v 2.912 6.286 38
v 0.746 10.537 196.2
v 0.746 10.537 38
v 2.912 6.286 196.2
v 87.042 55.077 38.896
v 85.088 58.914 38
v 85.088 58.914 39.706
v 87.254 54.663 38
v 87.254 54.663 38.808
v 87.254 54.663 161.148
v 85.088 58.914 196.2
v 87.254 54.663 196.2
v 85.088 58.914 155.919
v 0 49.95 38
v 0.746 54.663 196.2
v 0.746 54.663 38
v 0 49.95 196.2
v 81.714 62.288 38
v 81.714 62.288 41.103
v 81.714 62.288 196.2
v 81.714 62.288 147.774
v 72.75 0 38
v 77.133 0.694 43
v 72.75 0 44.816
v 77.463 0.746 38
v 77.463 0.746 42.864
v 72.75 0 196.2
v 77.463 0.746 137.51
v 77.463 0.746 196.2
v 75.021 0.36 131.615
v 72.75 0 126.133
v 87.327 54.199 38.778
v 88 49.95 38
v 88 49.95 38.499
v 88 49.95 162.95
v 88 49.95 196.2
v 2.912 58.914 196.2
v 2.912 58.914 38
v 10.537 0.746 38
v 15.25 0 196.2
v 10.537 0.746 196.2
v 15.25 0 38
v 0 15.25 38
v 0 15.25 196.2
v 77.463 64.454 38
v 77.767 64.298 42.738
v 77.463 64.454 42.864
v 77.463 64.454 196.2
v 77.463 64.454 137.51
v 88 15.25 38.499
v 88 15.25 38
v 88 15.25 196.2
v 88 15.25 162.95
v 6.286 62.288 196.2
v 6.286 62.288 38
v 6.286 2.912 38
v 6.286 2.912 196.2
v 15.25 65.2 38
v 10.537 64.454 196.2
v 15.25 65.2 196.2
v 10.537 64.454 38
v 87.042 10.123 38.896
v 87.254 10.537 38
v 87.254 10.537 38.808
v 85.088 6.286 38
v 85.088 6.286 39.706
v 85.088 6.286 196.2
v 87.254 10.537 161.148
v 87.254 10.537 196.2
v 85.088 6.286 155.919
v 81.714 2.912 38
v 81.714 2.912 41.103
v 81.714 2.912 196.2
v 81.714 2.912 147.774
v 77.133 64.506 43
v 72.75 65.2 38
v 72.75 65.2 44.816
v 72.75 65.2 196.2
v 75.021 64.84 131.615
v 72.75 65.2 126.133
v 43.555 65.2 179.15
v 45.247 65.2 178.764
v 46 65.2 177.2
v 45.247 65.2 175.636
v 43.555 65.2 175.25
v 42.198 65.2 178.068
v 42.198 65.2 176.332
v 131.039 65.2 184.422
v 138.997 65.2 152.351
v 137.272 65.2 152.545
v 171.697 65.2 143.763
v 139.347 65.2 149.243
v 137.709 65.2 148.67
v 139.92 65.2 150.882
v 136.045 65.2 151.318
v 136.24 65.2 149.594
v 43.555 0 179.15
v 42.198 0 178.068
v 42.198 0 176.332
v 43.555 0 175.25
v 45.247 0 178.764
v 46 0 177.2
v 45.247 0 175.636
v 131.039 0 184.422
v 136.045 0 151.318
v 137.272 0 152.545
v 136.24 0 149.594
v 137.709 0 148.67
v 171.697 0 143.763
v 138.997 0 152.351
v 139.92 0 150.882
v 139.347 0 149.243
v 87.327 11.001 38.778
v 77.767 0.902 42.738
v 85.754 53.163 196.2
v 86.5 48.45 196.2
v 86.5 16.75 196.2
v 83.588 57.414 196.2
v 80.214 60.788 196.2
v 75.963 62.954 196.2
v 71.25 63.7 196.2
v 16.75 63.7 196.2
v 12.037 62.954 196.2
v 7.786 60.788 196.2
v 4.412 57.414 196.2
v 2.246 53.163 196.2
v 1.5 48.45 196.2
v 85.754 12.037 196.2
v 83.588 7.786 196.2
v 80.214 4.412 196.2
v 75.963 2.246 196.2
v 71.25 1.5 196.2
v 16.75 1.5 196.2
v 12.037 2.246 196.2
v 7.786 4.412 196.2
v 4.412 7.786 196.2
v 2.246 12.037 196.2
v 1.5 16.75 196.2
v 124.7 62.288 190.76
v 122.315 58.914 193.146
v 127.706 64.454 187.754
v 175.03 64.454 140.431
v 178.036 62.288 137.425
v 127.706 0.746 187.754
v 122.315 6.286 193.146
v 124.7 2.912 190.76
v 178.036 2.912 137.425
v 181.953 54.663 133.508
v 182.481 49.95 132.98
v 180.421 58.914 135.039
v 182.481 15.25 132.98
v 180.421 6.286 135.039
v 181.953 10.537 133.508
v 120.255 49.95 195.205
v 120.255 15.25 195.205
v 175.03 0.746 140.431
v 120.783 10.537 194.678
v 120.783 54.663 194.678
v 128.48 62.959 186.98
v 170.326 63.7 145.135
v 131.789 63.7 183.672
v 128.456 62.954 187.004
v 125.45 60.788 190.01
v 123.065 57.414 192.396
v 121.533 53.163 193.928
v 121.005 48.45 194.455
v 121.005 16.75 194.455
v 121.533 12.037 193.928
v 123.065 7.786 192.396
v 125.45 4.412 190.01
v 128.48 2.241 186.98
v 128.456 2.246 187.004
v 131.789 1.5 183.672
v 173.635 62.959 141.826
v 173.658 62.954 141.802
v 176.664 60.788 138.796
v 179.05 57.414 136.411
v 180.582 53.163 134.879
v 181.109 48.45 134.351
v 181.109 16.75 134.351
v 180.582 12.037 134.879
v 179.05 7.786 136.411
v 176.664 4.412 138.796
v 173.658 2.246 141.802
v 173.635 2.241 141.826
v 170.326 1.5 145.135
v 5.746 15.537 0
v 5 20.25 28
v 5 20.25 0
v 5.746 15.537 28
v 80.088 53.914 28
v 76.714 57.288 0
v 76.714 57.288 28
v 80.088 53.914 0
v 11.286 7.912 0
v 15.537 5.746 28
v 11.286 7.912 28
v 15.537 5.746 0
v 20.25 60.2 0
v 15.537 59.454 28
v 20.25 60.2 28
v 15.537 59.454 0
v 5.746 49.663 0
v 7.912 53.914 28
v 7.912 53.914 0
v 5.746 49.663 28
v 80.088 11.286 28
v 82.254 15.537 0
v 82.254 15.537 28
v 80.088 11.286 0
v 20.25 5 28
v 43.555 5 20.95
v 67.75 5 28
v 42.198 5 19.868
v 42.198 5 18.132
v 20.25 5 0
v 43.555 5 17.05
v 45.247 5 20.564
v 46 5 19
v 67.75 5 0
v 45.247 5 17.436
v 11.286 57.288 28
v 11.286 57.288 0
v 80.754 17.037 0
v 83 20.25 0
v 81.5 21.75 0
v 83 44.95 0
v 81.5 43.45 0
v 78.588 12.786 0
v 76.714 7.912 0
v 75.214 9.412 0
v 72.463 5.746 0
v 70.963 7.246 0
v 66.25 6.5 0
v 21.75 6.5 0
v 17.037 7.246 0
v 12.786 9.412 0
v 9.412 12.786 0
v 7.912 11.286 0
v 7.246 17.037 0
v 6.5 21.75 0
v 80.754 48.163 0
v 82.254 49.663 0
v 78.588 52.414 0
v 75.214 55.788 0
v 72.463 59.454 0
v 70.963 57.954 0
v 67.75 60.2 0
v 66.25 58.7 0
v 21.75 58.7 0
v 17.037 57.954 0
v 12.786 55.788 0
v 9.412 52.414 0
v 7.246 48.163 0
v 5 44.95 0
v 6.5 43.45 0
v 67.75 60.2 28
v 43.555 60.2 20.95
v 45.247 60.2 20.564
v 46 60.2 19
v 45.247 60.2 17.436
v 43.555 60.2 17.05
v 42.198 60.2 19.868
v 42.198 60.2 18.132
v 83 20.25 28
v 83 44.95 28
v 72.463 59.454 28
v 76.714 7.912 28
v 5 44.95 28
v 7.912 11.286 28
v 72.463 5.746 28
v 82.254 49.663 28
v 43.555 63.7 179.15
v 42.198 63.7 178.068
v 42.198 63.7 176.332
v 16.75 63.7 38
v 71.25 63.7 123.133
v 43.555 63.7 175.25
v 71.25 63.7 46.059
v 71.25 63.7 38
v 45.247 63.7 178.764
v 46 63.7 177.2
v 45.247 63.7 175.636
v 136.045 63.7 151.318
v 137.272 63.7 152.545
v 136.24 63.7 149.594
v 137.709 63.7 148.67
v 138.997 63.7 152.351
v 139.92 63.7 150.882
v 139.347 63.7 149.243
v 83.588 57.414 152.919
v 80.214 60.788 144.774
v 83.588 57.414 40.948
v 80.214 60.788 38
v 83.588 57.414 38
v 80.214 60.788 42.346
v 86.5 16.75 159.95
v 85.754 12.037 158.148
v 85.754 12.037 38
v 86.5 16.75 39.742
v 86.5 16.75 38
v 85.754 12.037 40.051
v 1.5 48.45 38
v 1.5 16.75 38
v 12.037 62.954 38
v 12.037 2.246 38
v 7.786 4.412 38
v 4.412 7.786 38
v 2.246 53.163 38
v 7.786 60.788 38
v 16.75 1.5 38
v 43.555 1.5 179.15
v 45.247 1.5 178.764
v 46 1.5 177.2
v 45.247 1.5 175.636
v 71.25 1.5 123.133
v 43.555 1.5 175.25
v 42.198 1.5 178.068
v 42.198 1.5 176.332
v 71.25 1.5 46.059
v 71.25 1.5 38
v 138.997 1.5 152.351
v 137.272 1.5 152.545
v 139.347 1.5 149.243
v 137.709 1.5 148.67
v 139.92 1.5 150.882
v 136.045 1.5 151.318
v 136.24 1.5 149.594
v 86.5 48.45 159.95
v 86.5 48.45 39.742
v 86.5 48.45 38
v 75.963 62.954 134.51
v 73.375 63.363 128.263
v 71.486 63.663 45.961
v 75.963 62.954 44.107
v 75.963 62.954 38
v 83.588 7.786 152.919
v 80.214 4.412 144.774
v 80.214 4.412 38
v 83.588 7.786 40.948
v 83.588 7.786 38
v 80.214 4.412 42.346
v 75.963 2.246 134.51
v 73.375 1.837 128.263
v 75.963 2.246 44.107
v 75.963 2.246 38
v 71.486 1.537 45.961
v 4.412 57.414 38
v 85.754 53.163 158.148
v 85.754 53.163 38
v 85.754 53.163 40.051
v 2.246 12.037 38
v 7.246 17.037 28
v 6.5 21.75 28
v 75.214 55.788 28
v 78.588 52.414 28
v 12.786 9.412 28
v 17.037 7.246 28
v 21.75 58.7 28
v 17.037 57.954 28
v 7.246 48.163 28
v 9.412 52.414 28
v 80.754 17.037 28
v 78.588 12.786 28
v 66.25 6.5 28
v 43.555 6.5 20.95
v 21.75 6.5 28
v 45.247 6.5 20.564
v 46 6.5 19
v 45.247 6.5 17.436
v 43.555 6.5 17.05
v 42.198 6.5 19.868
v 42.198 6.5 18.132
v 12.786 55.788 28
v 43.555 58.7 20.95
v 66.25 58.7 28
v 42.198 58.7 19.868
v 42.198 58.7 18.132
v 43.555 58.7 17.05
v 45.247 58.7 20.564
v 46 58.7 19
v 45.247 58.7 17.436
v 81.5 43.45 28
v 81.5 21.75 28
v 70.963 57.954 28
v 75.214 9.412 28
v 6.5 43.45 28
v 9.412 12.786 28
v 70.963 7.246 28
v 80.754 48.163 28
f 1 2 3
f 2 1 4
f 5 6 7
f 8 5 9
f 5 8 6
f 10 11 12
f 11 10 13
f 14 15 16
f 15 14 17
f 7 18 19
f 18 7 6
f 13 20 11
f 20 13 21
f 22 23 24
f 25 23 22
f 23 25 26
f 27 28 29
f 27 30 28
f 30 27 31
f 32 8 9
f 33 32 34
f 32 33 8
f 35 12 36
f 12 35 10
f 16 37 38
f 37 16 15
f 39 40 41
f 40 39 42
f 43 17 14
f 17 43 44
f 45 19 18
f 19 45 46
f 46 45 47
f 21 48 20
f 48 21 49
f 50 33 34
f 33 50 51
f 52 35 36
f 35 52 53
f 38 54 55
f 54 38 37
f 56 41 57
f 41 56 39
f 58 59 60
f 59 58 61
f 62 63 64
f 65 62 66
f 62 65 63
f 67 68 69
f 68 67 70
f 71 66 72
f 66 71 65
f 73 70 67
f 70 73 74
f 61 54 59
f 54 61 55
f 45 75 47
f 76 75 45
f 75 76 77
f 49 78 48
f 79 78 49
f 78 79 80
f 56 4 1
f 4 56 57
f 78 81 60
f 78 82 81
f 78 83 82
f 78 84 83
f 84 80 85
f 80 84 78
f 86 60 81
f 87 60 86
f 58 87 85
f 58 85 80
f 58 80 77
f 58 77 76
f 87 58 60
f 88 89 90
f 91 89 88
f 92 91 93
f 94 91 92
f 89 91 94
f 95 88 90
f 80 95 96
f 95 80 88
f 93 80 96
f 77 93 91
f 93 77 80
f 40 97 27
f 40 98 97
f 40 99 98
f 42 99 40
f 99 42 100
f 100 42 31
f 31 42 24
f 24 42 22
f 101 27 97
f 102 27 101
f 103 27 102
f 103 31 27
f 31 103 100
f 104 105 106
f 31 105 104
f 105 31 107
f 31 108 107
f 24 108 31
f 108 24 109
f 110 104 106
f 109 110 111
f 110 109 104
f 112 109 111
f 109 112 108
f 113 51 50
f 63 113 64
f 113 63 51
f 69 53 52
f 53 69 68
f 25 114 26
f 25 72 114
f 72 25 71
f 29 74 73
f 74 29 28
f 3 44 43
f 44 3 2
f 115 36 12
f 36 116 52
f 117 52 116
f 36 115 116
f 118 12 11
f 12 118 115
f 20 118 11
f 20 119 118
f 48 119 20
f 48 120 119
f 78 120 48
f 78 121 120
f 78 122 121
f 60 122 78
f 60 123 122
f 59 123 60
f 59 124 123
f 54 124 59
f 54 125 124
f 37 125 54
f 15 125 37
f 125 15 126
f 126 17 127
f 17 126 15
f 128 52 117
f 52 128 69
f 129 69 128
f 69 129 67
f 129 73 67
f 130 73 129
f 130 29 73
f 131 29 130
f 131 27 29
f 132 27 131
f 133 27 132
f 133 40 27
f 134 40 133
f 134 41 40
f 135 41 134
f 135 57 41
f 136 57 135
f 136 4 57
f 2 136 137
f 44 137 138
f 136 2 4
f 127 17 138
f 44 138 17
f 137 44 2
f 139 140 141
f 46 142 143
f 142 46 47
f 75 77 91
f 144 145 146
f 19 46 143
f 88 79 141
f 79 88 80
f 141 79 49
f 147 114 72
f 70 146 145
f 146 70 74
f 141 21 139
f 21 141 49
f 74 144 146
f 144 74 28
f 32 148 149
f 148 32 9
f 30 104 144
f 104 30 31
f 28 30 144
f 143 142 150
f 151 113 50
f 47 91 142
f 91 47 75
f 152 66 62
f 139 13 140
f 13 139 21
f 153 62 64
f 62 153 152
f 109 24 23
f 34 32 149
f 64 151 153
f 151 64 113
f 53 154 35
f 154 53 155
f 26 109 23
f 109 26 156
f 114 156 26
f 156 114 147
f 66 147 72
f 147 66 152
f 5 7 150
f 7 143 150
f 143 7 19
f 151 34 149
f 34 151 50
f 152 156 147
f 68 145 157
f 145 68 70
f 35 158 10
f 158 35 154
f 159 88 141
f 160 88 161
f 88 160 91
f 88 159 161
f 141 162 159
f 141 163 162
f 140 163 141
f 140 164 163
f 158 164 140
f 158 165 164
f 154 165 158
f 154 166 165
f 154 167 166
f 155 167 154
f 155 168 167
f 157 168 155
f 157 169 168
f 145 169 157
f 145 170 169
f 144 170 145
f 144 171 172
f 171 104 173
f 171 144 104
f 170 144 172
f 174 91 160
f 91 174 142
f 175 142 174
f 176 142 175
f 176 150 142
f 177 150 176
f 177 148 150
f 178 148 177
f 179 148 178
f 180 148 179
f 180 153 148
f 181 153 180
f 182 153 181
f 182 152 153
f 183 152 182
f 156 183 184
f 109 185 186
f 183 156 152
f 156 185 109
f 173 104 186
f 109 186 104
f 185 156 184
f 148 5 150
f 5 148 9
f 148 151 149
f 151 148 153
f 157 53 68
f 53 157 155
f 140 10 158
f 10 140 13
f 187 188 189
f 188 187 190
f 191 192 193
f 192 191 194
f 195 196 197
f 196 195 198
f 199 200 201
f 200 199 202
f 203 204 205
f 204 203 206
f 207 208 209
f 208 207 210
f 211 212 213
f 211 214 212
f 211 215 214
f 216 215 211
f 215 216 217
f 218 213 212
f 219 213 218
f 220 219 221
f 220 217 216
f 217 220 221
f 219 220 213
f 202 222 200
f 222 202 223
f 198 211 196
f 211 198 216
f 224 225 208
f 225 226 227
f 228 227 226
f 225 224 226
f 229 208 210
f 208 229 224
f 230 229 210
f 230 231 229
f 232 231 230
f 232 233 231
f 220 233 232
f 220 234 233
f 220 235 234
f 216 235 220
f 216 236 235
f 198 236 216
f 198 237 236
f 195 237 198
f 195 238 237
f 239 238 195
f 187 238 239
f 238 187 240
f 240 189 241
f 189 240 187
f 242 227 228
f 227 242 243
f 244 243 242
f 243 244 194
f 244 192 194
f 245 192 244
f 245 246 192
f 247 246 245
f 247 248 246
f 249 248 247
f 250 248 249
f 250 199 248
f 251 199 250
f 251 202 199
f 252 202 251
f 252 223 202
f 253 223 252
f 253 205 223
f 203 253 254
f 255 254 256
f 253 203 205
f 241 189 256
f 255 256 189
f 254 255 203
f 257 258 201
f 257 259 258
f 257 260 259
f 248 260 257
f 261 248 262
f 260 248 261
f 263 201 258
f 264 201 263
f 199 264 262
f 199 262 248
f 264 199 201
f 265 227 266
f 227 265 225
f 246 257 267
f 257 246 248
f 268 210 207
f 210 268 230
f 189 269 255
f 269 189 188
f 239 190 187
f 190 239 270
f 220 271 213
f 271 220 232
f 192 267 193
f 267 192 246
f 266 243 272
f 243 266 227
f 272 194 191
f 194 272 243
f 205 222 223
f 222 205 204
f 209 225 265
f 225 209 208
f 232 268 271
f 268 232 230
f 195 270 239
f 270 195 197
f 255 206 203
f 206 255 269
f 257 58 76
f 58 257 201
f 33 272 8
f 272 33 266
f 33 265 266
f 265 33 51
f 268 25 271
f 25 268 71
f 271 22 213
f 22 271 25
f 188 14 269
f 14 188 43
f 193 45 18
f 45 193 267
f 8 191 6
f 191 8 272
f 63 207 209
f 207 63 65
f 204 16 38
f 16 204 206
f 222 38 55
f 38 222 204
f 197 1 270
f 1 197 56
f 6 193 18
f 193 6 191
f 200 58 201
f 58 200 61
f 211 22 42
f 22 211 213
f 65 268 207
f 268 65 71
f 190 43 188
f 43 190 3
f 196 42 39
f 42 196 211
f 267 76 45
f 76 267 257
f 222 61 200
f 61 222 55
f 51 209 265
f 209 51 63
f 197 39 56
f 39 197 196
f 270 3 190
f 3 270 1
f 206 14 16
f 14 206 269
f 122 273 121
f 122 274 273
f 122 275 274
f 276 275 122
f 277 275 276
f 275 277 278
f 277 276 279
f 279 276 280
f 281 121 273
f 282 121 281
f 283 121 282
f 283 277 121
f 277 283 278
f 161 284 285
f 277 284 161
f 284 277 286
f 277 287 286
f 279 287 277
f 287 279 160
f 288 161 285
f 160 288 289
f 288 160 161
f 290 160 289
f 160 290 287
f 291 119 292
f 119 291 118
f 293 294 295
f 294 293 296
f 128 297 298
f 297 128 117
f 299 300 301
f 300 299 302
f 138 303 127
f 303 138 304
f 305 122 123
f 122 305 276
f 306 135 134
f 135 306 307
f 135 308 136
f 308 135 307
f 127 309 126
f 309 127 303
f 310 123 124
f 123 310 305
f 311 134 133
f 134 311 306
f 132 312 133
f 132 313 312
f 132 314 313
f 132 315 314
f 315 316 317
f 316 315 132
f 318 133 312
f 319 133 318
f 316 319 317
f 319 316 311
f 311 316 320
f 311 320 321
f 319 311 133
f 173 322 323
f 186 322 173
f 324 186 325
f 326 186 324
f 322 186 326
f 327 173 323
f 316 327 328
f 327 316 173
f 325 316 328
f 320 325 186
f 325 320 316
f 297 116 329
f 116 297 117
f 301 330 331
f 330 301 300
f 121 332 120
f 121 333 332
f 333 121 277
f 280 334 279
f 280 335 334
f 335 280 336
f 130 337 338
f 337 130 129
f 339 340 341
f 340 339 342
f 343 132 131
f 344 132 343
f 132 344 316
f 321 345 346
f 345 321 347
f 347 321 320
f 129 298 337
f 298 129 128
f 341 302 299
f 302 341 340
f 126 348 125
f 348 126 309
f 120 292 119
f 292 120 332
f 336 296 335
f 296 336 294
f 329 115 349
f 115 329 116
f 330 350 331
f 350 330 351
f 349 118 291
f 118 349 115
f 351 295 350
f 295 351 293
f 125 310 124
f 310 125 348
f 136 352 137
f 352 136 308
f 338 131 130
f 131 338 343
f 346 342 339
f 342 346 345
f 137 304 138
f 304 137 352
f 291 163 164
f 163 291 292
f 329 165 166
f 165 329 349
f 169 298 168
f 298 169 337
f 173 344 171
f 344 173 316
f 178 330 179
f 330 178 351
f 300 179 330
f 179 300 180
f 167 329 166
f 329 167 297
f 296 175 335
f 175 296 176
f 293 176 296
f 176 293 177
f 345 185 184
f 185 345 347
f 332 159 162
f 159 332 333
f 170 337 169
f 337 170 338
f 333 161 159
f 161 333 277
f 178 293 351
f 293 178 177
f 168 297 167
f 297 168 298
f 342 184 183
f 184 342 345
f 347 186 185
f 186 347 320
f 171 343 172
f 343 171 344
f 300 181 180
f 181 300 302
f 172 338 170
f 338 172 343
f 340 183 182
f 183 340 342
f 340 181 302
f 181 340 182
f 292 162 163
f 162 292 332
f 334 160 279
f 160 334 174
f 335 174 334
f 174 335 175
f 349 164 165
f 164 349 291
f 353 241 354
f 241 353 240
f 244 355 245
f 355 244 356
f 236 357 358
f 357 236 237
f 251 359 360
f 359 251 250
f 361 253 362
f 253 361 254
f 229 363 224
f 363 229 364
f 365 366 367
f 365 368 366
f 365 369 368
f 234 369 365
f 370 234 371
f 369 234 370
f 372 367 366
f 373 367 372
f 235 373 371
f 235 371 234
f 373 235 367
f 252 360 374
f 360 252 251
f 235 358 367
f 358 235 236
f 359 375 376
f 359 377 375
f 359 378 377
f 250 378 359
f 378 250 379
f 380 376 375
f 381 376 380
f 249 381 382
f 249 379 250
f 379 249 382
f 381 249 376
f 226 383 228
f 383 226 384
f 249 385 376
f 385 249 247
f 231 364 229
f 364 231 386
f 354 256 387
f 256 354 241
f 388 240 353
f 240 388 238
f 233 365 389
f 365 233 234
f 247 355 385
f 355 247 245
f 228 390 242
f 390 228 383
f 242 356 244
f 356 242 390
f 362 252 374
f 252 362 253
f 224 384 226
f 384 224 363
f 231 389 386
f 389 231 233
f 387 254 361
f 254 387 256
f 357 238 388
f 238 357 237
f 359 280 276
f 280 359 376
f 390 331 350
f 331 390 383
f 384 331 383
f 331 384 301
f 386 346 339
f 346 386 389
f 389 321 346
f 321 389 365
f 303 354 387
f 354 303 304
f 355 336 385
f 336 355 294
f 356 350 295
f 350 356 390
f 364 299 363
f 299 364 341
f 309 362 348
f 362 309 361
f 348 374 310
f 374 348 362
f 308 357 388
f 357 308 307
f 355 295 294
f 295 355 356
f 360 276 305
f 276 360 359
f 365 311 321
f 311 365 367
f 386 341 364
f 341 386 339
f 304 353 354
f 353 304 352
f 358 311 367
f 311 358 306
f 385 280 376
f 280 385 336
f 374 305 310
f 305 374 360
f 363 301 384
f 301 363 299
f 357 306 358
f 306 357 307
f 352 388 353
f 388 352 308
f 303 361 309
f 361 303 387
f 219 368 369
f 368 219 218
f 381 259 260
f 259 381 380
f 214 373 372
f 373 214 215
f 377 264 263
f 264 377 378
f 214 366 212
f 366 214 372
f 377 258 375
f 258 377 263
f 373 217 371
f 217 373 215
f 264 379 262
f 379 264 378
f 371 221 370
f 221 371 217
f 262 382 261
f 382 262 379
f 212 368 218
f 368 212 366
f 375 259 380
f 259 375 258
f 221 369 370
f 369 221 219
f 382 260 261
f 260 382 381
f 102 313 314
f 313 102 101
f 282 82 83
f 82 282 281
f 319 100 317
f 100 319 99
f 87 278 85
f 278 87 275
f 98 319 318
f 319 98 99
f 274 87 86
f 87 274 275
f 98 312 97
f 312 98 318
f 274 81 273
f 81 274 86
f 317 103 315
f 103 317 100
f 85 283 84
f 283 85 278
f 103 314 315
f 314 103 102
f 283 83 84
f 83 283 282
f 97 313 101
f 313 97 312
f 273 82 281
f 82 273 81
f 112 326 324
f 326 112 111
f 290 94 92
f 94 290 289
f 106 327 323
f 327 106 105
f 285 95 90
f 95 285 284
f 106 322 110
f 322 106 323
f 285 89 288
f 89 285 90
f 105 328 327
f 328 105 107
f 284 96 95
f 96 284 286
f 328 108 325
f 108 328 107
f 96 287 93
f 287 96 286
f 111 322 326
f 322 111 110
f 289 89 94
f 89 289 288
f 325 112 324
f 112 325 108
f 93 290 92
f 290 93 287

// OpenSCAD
// Gutter Downspout "T" Junction
// by Nathan Wittstock <nate@fardog.io>

// preview[view: south east, tilt: top diagonal]

/* [Downspout] */
// width of downspout opening
downspout_w = 85;
// height of downspout opening
downspout_h = 62.2;
// downspout corner radius
downspout_r = 15.25;

/* [Adapter] */
// depth of downspout inserts
insert_d = 90.2;
// size to reduce downspout insert
insert_allowance = 10;
// depth of outer insert
outer_d = 63.5;
// thickness of adapter
thickness = 3;

/* [Attachment] */
// diameter of screw holes
screw_d = 4;
// distance to offset screw holes from edges
screw_offset = 19.0;

/* [Hidden] */
downspout_vec = [downspout_w, downspout_h];
screw_l = downspout_h + thickness; 
total_height = insert_d + outer_d + downspout_w/2;

module roundrect(vect, r, $fn=20) {
    sq = len(vect) > 1
        ? [for (i = [0:1:len(vect)-1]) vect[i] - r * 2]
        : vect - r * 2;
    minkowski() {
        square(sq);
        translate([r, r])
            circle(r=r);
    }
}

function inch_to_mm(inches) = inches * 25.4;
function increase(vec, amt) = [for (i = vec) i + amt];

module adapt_allowance(vec) {
    hull() {
        translate([insert_allowance/2, insert_allowance/2, 0])
            linear_extrude(1) roundrect(increase(vec, -insert_allowance), downspout_r);
        translate([0, 0, insert_allowance]) linear_extrude(1) roundrect(vec, downspout_r);
    }
}

module inner(vec) {
    union() {
        difference() {
            union() {
                linear_extrude(total_height)
                    roundrect(vec, downspout_r);
                translate([downspout_r, 0, insert_d])
                    rotate([0, 45, 0])
                        linear_extrude(downspout_w + outer_d)
                            roundrect(vec, downspout_r);
            }
            linear_extrude(screw_offset*2)
                roundrect(vec, downspout_r);
        }
        linear_extrude(screw_offset*2-insert_allowance)
            translate([insert_allowance/2, insert_allowance/2, 0])
            roundrect(increase(vec, -insert_allowance), downspout_r);
        translate([0, 0, screw_offset*2-insert_allowance])
            adapt_allowance(vec);
    }
}

module screw_through() {
    rotate([-90, 0, 0])
        linear_extrude(screw_l) circle(d=screw_d, center=true);
}

module screws() {
    x = (downspout_w + thickness) / 2;
    translate([x, 0, screw_offset])
        screw_through();
    translate([x, 0, total_height - screw_offset])
        screw_through();
    translate([downspout_r, 0, insert_d])
        rotate([0, 45, 0])
            translate([x, 0, downspout_w + outer_d - screw_offset])
                screw_through();
}

difference() {
    inner(increase(downspout_vec, thickness));
    translate([thickness/2, thickness/2]) inner(downspout_vec);
    screws();
}
